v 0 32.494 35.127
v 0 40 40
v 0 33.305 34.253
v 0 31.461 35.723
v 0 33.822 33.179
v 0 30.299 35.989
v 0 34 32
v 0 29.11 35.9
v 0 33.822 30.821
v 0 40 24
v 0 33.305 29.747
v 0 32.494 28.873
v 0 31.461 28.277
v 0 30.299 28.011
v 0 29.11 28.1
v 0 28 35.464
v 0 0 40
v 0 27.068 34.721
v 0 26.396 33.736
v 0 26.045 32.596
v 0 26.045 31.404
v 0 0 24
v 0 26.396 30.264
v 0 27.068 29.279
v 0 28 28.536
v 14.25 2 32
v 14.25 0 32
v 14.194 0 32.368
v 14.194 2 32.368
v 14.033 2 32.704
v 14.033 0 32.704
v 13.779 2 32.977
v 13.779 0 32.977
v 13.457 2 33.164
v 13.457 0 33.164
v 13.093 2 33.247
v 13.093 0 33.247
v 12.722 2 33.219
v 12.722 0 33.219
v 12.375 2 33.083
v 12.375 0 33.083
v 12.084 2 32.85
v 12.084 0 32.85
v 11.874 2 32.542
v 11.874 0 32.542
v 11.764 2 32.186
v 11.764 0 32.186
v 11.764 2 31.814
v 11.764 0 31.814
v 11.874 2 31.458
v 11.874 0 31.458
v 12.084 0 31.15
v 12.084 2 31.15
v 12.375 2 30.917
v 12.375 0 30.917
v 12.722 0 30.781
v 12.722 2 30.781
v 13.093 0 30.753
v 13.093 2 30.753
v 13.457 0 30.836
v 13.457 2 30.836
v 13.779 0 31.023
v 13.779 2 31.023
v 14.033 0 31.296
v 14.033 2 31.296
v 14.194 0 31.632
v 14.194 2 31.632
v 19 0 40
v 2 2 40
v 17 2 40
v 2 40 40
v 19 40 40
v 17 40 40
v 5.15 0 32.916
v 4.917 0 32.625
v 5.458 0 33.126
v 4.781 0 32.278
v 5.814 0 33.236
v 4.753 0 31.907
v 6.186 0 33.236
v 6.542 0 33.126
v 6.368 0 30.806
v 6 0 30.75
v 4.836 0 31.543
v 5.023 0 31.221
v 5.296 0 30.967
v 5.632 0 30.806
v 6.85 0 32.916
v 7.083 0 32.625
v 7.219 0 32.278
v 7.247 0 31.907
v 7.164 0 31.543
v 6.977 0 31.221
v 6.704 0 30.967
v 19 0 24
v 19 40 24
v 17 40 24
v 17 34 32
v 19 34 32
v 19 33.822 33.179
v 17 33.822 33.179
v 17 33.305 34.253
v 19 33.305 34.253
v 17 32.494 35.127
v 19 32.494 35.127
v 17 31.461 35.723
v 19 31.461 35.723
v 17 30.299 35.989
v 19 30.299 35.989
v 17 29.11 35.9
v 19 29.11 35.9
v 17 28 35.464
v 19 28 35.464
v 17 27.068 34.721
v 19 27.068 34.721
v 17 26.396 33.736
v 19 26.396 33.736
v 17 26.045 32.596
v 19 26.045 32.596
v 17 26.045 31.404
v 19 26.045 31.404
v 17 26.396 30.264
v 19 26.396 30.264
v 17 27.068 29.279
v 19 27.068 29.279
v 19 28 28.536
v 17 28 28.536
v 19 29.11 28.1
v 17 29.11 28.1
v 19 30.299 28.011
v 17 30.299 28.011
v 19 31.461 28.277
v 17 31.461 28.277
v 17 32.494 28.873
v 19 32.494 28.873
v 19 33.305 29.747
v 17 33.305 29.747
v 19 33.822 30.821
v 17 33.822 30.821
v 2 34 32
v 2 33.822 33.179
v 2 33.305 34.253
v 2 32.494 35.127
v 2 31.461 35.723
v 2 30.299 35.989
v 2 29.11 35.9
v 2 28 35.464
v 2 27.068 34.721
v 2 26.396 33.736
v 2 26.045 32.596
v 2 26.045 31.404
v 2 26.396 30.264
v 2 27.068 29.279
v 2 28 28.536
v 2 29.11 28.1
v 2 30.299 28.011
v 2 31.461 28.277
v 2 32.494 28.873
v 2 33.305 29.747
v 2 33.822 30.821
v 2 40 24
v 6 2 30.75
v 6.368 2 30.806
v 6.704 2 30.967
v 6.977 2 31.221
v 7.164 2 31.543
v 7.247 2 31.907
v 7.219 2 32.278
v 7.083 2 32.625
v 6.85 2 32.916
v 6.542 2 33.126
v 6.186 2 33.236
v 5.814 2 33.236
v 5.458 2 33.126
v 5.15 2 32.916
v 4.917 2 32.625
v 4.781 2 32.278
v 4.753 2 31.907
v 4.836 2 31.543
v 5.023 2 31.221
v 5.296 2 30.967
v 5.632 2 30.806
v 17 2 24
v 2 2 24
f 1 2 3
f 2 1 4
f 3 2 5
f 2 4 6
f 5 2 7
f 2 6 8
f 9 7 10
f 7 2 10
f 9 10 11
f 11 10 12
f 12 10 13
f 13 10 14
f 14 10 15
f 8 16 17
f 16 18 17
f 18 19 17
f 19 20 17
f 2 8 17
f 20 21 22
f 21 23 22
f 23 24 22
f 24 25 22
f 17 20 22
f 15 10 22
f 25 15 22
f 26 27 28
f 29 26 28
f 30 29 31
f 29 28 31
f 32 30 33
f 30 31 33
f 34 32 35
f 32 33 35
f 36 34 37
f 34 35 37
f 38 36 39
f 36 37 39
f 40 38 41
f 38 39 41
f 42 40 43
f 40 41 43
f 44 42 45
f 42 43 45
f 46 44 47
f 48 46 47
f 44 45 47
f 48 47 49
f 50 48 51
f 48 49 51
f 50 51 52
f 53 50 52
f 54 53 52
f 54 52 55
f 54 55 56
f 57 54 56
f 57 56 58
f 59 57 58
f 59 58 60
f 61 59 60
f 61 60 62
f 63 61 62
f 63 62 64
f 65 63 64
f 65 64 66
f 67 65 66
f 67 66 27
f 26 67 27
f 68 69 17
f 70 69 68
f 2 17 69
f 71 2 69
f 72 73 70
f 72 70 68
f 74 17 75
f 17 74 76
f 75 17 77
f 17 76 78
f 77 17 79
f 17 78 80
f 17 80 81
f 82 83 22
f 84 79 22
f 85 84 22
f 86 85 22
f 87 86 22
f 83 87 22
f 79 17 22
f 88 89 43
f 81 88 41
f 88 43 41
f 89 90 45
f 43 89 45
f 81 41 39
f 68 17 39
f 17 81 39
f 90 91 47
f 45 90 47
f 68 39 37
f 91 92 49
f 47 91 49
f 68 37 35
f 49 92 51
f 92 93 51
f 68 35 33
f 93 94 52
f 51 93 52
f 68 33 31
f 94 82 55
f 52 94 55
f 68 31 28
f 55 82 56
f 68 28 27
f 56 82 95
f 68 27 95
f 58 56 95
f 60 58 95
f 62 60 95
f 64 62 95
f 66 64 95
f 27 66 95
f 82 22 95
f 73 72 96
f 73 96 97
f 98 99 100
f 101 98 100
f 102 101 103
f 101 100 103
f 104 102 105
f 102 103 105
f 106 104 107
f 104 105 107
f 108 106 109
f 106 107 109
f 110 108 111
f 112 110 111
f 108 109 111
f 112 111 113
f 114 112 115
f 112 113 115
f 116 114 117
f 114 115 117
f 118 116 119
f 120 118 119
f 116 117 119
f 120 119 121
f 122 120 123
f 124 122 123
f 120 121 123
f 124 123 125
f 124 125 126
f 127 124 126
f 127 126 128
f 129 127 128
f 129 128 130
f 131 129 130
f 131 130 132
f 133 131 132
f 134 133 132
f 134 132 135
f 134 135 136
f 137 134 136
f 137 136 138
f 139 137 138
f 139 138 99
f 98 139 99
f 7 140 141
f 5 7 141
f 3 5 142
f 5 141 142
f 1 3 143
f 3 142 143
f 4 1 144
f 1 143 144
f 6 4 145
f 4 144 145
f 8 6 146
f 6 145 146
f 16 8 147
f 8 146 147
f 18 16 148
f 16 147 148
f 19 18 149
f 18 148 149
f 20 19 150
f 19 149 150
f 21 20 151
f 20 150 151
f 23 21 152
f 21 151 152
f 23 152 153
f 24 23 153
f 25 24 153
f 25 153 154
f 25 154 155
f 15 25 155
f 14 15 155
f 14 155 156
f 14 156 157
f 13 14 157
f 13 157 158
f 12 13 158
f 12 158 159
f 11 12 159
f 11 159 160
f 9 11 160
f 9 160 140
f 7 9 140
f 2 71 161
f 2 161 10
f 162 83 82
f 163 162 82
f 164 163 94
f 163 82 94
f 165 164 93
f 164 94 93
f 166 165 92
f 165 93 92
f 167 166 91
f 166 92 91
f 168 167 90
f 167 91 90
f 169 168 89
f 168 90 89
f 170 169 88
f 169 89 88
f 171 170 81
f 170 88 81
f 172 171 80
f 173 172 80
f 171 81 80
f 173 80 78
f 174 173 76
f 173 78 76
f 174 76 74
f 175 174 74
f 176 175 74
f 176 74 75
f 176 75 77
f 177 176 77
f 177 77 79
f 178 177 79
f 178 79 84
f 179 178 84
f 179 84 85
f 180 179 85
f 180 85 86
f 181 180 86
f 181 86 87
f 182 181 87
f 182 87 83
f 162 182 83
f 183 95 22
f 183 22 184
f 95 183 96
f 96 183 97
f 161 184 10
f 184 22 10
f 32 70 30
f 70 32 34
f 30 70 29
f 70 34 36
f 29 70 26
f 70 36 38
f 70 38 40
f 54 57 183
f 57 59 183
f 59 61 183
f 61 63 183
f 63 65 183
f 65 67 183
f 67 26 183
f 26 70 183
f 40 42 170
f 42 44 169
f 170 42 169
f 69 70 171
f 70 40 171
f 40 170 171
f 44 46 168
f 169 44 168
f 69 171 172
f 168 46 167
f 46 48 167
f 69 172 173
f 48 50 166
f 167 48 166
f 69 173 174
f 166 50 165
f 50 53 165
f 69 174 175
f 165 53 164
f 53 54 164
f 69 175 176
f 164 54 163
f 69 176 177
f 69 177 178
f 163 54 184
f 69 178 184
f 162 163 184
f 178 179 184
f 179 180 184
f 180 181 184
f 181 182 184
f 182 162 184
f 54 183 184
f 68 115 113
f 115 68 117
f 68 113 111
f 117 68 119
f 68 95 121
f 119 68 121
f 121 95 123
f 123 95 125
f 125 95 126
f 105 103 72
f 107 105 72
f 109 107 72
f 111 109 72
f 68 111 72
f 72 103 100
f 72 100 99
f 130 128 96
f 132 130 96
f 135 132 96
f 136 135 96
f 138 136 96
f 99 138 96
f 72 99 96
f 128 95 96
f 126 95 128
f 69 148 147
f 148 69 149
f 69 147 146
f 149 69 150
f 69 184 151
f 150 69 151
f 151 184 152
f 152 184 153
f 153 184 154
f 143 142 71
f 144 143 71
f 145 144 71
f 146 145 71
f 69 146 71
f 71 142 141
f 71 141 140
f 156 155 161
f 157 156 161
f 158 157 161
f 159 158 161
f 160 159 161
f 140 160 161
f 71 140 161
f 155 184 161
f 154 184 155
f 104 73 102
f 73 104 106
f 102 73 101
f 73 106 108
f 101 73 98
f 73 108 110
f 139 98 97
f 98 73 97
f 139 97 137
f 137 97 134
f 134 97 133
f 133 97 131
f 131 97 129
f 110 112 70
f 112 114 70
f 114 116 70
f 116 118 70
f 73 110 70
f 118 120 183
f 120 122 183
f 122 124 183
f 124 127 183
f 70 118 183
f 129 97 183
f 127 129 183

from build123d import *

# Parameters (mm, degrees)
EXTRUDE_1_DEPTH     = 40
SKETCH_2_R          = 4
CUT_EXTRUDE_1_DEPTH = 60.674114991
SKETCH_5_W          = 24
SKETCH_5_H          = 40
CUT_EXTRUDE_4_DEPTH = 60.674114991
SKETCH_6_R          = 1.25
CUT_EXTRUDE_5_DEPTH = 60.674114991


with BuildPart() as part:
    # 草图1 → 凸台-拉伸1 (new body)
    with BuildSketch(Plane.XY):
        Polygon((0, 0), (2, 0), (17, 0), (19, 0), (19, 40), (17, 40), (17, 2), (2, 2), (2, 40), (0, 40), align=None)
    extrude(amount=EXTRUDE_1_DEPTH)

    # 草图2 → 切除-拉伸1 (cut, through all)
    with BuildSketch(Plane(origin=(19, 0, 0), x_dir=(0, 0, -1), z_dir=(1, 0, 0))):
        with Locations(Location((-32, 30, 0), (0, 0, 90))):
            Circle(SKETCH_2_R)
    extrude(amount=-CUT_EXTRUDE_1_DEPTH, mode=Mode.SUBTRACT)

    # 草图5 → 切除-拉伸4 (cut, through all)
    with BuildSketch(Plane.ZY):
        with Locations((12, 20)):
            Rectangle(SKETCH_5_W, SKETCH_5_H)
    extrude(amount=-CUT_EXTRUDE_4_DEPTH, mode=Mode.SUBTRACT)

    # 草图6 → 切除-拉伸5 (cut, through all)
    with BuildSketch(Plane.XZ):
        with Locations((13, 32)):
            Circle(SKETCH_6_R)
        with Locations(Location((6, 32, 0), (0, 0, 270))):
            Circle(SKETCH_6_R)
    extrude(amount=-CUT_EXTRUDE_5_DEPTH, mode=Mode.SUBTRACT)


solid = part.part
